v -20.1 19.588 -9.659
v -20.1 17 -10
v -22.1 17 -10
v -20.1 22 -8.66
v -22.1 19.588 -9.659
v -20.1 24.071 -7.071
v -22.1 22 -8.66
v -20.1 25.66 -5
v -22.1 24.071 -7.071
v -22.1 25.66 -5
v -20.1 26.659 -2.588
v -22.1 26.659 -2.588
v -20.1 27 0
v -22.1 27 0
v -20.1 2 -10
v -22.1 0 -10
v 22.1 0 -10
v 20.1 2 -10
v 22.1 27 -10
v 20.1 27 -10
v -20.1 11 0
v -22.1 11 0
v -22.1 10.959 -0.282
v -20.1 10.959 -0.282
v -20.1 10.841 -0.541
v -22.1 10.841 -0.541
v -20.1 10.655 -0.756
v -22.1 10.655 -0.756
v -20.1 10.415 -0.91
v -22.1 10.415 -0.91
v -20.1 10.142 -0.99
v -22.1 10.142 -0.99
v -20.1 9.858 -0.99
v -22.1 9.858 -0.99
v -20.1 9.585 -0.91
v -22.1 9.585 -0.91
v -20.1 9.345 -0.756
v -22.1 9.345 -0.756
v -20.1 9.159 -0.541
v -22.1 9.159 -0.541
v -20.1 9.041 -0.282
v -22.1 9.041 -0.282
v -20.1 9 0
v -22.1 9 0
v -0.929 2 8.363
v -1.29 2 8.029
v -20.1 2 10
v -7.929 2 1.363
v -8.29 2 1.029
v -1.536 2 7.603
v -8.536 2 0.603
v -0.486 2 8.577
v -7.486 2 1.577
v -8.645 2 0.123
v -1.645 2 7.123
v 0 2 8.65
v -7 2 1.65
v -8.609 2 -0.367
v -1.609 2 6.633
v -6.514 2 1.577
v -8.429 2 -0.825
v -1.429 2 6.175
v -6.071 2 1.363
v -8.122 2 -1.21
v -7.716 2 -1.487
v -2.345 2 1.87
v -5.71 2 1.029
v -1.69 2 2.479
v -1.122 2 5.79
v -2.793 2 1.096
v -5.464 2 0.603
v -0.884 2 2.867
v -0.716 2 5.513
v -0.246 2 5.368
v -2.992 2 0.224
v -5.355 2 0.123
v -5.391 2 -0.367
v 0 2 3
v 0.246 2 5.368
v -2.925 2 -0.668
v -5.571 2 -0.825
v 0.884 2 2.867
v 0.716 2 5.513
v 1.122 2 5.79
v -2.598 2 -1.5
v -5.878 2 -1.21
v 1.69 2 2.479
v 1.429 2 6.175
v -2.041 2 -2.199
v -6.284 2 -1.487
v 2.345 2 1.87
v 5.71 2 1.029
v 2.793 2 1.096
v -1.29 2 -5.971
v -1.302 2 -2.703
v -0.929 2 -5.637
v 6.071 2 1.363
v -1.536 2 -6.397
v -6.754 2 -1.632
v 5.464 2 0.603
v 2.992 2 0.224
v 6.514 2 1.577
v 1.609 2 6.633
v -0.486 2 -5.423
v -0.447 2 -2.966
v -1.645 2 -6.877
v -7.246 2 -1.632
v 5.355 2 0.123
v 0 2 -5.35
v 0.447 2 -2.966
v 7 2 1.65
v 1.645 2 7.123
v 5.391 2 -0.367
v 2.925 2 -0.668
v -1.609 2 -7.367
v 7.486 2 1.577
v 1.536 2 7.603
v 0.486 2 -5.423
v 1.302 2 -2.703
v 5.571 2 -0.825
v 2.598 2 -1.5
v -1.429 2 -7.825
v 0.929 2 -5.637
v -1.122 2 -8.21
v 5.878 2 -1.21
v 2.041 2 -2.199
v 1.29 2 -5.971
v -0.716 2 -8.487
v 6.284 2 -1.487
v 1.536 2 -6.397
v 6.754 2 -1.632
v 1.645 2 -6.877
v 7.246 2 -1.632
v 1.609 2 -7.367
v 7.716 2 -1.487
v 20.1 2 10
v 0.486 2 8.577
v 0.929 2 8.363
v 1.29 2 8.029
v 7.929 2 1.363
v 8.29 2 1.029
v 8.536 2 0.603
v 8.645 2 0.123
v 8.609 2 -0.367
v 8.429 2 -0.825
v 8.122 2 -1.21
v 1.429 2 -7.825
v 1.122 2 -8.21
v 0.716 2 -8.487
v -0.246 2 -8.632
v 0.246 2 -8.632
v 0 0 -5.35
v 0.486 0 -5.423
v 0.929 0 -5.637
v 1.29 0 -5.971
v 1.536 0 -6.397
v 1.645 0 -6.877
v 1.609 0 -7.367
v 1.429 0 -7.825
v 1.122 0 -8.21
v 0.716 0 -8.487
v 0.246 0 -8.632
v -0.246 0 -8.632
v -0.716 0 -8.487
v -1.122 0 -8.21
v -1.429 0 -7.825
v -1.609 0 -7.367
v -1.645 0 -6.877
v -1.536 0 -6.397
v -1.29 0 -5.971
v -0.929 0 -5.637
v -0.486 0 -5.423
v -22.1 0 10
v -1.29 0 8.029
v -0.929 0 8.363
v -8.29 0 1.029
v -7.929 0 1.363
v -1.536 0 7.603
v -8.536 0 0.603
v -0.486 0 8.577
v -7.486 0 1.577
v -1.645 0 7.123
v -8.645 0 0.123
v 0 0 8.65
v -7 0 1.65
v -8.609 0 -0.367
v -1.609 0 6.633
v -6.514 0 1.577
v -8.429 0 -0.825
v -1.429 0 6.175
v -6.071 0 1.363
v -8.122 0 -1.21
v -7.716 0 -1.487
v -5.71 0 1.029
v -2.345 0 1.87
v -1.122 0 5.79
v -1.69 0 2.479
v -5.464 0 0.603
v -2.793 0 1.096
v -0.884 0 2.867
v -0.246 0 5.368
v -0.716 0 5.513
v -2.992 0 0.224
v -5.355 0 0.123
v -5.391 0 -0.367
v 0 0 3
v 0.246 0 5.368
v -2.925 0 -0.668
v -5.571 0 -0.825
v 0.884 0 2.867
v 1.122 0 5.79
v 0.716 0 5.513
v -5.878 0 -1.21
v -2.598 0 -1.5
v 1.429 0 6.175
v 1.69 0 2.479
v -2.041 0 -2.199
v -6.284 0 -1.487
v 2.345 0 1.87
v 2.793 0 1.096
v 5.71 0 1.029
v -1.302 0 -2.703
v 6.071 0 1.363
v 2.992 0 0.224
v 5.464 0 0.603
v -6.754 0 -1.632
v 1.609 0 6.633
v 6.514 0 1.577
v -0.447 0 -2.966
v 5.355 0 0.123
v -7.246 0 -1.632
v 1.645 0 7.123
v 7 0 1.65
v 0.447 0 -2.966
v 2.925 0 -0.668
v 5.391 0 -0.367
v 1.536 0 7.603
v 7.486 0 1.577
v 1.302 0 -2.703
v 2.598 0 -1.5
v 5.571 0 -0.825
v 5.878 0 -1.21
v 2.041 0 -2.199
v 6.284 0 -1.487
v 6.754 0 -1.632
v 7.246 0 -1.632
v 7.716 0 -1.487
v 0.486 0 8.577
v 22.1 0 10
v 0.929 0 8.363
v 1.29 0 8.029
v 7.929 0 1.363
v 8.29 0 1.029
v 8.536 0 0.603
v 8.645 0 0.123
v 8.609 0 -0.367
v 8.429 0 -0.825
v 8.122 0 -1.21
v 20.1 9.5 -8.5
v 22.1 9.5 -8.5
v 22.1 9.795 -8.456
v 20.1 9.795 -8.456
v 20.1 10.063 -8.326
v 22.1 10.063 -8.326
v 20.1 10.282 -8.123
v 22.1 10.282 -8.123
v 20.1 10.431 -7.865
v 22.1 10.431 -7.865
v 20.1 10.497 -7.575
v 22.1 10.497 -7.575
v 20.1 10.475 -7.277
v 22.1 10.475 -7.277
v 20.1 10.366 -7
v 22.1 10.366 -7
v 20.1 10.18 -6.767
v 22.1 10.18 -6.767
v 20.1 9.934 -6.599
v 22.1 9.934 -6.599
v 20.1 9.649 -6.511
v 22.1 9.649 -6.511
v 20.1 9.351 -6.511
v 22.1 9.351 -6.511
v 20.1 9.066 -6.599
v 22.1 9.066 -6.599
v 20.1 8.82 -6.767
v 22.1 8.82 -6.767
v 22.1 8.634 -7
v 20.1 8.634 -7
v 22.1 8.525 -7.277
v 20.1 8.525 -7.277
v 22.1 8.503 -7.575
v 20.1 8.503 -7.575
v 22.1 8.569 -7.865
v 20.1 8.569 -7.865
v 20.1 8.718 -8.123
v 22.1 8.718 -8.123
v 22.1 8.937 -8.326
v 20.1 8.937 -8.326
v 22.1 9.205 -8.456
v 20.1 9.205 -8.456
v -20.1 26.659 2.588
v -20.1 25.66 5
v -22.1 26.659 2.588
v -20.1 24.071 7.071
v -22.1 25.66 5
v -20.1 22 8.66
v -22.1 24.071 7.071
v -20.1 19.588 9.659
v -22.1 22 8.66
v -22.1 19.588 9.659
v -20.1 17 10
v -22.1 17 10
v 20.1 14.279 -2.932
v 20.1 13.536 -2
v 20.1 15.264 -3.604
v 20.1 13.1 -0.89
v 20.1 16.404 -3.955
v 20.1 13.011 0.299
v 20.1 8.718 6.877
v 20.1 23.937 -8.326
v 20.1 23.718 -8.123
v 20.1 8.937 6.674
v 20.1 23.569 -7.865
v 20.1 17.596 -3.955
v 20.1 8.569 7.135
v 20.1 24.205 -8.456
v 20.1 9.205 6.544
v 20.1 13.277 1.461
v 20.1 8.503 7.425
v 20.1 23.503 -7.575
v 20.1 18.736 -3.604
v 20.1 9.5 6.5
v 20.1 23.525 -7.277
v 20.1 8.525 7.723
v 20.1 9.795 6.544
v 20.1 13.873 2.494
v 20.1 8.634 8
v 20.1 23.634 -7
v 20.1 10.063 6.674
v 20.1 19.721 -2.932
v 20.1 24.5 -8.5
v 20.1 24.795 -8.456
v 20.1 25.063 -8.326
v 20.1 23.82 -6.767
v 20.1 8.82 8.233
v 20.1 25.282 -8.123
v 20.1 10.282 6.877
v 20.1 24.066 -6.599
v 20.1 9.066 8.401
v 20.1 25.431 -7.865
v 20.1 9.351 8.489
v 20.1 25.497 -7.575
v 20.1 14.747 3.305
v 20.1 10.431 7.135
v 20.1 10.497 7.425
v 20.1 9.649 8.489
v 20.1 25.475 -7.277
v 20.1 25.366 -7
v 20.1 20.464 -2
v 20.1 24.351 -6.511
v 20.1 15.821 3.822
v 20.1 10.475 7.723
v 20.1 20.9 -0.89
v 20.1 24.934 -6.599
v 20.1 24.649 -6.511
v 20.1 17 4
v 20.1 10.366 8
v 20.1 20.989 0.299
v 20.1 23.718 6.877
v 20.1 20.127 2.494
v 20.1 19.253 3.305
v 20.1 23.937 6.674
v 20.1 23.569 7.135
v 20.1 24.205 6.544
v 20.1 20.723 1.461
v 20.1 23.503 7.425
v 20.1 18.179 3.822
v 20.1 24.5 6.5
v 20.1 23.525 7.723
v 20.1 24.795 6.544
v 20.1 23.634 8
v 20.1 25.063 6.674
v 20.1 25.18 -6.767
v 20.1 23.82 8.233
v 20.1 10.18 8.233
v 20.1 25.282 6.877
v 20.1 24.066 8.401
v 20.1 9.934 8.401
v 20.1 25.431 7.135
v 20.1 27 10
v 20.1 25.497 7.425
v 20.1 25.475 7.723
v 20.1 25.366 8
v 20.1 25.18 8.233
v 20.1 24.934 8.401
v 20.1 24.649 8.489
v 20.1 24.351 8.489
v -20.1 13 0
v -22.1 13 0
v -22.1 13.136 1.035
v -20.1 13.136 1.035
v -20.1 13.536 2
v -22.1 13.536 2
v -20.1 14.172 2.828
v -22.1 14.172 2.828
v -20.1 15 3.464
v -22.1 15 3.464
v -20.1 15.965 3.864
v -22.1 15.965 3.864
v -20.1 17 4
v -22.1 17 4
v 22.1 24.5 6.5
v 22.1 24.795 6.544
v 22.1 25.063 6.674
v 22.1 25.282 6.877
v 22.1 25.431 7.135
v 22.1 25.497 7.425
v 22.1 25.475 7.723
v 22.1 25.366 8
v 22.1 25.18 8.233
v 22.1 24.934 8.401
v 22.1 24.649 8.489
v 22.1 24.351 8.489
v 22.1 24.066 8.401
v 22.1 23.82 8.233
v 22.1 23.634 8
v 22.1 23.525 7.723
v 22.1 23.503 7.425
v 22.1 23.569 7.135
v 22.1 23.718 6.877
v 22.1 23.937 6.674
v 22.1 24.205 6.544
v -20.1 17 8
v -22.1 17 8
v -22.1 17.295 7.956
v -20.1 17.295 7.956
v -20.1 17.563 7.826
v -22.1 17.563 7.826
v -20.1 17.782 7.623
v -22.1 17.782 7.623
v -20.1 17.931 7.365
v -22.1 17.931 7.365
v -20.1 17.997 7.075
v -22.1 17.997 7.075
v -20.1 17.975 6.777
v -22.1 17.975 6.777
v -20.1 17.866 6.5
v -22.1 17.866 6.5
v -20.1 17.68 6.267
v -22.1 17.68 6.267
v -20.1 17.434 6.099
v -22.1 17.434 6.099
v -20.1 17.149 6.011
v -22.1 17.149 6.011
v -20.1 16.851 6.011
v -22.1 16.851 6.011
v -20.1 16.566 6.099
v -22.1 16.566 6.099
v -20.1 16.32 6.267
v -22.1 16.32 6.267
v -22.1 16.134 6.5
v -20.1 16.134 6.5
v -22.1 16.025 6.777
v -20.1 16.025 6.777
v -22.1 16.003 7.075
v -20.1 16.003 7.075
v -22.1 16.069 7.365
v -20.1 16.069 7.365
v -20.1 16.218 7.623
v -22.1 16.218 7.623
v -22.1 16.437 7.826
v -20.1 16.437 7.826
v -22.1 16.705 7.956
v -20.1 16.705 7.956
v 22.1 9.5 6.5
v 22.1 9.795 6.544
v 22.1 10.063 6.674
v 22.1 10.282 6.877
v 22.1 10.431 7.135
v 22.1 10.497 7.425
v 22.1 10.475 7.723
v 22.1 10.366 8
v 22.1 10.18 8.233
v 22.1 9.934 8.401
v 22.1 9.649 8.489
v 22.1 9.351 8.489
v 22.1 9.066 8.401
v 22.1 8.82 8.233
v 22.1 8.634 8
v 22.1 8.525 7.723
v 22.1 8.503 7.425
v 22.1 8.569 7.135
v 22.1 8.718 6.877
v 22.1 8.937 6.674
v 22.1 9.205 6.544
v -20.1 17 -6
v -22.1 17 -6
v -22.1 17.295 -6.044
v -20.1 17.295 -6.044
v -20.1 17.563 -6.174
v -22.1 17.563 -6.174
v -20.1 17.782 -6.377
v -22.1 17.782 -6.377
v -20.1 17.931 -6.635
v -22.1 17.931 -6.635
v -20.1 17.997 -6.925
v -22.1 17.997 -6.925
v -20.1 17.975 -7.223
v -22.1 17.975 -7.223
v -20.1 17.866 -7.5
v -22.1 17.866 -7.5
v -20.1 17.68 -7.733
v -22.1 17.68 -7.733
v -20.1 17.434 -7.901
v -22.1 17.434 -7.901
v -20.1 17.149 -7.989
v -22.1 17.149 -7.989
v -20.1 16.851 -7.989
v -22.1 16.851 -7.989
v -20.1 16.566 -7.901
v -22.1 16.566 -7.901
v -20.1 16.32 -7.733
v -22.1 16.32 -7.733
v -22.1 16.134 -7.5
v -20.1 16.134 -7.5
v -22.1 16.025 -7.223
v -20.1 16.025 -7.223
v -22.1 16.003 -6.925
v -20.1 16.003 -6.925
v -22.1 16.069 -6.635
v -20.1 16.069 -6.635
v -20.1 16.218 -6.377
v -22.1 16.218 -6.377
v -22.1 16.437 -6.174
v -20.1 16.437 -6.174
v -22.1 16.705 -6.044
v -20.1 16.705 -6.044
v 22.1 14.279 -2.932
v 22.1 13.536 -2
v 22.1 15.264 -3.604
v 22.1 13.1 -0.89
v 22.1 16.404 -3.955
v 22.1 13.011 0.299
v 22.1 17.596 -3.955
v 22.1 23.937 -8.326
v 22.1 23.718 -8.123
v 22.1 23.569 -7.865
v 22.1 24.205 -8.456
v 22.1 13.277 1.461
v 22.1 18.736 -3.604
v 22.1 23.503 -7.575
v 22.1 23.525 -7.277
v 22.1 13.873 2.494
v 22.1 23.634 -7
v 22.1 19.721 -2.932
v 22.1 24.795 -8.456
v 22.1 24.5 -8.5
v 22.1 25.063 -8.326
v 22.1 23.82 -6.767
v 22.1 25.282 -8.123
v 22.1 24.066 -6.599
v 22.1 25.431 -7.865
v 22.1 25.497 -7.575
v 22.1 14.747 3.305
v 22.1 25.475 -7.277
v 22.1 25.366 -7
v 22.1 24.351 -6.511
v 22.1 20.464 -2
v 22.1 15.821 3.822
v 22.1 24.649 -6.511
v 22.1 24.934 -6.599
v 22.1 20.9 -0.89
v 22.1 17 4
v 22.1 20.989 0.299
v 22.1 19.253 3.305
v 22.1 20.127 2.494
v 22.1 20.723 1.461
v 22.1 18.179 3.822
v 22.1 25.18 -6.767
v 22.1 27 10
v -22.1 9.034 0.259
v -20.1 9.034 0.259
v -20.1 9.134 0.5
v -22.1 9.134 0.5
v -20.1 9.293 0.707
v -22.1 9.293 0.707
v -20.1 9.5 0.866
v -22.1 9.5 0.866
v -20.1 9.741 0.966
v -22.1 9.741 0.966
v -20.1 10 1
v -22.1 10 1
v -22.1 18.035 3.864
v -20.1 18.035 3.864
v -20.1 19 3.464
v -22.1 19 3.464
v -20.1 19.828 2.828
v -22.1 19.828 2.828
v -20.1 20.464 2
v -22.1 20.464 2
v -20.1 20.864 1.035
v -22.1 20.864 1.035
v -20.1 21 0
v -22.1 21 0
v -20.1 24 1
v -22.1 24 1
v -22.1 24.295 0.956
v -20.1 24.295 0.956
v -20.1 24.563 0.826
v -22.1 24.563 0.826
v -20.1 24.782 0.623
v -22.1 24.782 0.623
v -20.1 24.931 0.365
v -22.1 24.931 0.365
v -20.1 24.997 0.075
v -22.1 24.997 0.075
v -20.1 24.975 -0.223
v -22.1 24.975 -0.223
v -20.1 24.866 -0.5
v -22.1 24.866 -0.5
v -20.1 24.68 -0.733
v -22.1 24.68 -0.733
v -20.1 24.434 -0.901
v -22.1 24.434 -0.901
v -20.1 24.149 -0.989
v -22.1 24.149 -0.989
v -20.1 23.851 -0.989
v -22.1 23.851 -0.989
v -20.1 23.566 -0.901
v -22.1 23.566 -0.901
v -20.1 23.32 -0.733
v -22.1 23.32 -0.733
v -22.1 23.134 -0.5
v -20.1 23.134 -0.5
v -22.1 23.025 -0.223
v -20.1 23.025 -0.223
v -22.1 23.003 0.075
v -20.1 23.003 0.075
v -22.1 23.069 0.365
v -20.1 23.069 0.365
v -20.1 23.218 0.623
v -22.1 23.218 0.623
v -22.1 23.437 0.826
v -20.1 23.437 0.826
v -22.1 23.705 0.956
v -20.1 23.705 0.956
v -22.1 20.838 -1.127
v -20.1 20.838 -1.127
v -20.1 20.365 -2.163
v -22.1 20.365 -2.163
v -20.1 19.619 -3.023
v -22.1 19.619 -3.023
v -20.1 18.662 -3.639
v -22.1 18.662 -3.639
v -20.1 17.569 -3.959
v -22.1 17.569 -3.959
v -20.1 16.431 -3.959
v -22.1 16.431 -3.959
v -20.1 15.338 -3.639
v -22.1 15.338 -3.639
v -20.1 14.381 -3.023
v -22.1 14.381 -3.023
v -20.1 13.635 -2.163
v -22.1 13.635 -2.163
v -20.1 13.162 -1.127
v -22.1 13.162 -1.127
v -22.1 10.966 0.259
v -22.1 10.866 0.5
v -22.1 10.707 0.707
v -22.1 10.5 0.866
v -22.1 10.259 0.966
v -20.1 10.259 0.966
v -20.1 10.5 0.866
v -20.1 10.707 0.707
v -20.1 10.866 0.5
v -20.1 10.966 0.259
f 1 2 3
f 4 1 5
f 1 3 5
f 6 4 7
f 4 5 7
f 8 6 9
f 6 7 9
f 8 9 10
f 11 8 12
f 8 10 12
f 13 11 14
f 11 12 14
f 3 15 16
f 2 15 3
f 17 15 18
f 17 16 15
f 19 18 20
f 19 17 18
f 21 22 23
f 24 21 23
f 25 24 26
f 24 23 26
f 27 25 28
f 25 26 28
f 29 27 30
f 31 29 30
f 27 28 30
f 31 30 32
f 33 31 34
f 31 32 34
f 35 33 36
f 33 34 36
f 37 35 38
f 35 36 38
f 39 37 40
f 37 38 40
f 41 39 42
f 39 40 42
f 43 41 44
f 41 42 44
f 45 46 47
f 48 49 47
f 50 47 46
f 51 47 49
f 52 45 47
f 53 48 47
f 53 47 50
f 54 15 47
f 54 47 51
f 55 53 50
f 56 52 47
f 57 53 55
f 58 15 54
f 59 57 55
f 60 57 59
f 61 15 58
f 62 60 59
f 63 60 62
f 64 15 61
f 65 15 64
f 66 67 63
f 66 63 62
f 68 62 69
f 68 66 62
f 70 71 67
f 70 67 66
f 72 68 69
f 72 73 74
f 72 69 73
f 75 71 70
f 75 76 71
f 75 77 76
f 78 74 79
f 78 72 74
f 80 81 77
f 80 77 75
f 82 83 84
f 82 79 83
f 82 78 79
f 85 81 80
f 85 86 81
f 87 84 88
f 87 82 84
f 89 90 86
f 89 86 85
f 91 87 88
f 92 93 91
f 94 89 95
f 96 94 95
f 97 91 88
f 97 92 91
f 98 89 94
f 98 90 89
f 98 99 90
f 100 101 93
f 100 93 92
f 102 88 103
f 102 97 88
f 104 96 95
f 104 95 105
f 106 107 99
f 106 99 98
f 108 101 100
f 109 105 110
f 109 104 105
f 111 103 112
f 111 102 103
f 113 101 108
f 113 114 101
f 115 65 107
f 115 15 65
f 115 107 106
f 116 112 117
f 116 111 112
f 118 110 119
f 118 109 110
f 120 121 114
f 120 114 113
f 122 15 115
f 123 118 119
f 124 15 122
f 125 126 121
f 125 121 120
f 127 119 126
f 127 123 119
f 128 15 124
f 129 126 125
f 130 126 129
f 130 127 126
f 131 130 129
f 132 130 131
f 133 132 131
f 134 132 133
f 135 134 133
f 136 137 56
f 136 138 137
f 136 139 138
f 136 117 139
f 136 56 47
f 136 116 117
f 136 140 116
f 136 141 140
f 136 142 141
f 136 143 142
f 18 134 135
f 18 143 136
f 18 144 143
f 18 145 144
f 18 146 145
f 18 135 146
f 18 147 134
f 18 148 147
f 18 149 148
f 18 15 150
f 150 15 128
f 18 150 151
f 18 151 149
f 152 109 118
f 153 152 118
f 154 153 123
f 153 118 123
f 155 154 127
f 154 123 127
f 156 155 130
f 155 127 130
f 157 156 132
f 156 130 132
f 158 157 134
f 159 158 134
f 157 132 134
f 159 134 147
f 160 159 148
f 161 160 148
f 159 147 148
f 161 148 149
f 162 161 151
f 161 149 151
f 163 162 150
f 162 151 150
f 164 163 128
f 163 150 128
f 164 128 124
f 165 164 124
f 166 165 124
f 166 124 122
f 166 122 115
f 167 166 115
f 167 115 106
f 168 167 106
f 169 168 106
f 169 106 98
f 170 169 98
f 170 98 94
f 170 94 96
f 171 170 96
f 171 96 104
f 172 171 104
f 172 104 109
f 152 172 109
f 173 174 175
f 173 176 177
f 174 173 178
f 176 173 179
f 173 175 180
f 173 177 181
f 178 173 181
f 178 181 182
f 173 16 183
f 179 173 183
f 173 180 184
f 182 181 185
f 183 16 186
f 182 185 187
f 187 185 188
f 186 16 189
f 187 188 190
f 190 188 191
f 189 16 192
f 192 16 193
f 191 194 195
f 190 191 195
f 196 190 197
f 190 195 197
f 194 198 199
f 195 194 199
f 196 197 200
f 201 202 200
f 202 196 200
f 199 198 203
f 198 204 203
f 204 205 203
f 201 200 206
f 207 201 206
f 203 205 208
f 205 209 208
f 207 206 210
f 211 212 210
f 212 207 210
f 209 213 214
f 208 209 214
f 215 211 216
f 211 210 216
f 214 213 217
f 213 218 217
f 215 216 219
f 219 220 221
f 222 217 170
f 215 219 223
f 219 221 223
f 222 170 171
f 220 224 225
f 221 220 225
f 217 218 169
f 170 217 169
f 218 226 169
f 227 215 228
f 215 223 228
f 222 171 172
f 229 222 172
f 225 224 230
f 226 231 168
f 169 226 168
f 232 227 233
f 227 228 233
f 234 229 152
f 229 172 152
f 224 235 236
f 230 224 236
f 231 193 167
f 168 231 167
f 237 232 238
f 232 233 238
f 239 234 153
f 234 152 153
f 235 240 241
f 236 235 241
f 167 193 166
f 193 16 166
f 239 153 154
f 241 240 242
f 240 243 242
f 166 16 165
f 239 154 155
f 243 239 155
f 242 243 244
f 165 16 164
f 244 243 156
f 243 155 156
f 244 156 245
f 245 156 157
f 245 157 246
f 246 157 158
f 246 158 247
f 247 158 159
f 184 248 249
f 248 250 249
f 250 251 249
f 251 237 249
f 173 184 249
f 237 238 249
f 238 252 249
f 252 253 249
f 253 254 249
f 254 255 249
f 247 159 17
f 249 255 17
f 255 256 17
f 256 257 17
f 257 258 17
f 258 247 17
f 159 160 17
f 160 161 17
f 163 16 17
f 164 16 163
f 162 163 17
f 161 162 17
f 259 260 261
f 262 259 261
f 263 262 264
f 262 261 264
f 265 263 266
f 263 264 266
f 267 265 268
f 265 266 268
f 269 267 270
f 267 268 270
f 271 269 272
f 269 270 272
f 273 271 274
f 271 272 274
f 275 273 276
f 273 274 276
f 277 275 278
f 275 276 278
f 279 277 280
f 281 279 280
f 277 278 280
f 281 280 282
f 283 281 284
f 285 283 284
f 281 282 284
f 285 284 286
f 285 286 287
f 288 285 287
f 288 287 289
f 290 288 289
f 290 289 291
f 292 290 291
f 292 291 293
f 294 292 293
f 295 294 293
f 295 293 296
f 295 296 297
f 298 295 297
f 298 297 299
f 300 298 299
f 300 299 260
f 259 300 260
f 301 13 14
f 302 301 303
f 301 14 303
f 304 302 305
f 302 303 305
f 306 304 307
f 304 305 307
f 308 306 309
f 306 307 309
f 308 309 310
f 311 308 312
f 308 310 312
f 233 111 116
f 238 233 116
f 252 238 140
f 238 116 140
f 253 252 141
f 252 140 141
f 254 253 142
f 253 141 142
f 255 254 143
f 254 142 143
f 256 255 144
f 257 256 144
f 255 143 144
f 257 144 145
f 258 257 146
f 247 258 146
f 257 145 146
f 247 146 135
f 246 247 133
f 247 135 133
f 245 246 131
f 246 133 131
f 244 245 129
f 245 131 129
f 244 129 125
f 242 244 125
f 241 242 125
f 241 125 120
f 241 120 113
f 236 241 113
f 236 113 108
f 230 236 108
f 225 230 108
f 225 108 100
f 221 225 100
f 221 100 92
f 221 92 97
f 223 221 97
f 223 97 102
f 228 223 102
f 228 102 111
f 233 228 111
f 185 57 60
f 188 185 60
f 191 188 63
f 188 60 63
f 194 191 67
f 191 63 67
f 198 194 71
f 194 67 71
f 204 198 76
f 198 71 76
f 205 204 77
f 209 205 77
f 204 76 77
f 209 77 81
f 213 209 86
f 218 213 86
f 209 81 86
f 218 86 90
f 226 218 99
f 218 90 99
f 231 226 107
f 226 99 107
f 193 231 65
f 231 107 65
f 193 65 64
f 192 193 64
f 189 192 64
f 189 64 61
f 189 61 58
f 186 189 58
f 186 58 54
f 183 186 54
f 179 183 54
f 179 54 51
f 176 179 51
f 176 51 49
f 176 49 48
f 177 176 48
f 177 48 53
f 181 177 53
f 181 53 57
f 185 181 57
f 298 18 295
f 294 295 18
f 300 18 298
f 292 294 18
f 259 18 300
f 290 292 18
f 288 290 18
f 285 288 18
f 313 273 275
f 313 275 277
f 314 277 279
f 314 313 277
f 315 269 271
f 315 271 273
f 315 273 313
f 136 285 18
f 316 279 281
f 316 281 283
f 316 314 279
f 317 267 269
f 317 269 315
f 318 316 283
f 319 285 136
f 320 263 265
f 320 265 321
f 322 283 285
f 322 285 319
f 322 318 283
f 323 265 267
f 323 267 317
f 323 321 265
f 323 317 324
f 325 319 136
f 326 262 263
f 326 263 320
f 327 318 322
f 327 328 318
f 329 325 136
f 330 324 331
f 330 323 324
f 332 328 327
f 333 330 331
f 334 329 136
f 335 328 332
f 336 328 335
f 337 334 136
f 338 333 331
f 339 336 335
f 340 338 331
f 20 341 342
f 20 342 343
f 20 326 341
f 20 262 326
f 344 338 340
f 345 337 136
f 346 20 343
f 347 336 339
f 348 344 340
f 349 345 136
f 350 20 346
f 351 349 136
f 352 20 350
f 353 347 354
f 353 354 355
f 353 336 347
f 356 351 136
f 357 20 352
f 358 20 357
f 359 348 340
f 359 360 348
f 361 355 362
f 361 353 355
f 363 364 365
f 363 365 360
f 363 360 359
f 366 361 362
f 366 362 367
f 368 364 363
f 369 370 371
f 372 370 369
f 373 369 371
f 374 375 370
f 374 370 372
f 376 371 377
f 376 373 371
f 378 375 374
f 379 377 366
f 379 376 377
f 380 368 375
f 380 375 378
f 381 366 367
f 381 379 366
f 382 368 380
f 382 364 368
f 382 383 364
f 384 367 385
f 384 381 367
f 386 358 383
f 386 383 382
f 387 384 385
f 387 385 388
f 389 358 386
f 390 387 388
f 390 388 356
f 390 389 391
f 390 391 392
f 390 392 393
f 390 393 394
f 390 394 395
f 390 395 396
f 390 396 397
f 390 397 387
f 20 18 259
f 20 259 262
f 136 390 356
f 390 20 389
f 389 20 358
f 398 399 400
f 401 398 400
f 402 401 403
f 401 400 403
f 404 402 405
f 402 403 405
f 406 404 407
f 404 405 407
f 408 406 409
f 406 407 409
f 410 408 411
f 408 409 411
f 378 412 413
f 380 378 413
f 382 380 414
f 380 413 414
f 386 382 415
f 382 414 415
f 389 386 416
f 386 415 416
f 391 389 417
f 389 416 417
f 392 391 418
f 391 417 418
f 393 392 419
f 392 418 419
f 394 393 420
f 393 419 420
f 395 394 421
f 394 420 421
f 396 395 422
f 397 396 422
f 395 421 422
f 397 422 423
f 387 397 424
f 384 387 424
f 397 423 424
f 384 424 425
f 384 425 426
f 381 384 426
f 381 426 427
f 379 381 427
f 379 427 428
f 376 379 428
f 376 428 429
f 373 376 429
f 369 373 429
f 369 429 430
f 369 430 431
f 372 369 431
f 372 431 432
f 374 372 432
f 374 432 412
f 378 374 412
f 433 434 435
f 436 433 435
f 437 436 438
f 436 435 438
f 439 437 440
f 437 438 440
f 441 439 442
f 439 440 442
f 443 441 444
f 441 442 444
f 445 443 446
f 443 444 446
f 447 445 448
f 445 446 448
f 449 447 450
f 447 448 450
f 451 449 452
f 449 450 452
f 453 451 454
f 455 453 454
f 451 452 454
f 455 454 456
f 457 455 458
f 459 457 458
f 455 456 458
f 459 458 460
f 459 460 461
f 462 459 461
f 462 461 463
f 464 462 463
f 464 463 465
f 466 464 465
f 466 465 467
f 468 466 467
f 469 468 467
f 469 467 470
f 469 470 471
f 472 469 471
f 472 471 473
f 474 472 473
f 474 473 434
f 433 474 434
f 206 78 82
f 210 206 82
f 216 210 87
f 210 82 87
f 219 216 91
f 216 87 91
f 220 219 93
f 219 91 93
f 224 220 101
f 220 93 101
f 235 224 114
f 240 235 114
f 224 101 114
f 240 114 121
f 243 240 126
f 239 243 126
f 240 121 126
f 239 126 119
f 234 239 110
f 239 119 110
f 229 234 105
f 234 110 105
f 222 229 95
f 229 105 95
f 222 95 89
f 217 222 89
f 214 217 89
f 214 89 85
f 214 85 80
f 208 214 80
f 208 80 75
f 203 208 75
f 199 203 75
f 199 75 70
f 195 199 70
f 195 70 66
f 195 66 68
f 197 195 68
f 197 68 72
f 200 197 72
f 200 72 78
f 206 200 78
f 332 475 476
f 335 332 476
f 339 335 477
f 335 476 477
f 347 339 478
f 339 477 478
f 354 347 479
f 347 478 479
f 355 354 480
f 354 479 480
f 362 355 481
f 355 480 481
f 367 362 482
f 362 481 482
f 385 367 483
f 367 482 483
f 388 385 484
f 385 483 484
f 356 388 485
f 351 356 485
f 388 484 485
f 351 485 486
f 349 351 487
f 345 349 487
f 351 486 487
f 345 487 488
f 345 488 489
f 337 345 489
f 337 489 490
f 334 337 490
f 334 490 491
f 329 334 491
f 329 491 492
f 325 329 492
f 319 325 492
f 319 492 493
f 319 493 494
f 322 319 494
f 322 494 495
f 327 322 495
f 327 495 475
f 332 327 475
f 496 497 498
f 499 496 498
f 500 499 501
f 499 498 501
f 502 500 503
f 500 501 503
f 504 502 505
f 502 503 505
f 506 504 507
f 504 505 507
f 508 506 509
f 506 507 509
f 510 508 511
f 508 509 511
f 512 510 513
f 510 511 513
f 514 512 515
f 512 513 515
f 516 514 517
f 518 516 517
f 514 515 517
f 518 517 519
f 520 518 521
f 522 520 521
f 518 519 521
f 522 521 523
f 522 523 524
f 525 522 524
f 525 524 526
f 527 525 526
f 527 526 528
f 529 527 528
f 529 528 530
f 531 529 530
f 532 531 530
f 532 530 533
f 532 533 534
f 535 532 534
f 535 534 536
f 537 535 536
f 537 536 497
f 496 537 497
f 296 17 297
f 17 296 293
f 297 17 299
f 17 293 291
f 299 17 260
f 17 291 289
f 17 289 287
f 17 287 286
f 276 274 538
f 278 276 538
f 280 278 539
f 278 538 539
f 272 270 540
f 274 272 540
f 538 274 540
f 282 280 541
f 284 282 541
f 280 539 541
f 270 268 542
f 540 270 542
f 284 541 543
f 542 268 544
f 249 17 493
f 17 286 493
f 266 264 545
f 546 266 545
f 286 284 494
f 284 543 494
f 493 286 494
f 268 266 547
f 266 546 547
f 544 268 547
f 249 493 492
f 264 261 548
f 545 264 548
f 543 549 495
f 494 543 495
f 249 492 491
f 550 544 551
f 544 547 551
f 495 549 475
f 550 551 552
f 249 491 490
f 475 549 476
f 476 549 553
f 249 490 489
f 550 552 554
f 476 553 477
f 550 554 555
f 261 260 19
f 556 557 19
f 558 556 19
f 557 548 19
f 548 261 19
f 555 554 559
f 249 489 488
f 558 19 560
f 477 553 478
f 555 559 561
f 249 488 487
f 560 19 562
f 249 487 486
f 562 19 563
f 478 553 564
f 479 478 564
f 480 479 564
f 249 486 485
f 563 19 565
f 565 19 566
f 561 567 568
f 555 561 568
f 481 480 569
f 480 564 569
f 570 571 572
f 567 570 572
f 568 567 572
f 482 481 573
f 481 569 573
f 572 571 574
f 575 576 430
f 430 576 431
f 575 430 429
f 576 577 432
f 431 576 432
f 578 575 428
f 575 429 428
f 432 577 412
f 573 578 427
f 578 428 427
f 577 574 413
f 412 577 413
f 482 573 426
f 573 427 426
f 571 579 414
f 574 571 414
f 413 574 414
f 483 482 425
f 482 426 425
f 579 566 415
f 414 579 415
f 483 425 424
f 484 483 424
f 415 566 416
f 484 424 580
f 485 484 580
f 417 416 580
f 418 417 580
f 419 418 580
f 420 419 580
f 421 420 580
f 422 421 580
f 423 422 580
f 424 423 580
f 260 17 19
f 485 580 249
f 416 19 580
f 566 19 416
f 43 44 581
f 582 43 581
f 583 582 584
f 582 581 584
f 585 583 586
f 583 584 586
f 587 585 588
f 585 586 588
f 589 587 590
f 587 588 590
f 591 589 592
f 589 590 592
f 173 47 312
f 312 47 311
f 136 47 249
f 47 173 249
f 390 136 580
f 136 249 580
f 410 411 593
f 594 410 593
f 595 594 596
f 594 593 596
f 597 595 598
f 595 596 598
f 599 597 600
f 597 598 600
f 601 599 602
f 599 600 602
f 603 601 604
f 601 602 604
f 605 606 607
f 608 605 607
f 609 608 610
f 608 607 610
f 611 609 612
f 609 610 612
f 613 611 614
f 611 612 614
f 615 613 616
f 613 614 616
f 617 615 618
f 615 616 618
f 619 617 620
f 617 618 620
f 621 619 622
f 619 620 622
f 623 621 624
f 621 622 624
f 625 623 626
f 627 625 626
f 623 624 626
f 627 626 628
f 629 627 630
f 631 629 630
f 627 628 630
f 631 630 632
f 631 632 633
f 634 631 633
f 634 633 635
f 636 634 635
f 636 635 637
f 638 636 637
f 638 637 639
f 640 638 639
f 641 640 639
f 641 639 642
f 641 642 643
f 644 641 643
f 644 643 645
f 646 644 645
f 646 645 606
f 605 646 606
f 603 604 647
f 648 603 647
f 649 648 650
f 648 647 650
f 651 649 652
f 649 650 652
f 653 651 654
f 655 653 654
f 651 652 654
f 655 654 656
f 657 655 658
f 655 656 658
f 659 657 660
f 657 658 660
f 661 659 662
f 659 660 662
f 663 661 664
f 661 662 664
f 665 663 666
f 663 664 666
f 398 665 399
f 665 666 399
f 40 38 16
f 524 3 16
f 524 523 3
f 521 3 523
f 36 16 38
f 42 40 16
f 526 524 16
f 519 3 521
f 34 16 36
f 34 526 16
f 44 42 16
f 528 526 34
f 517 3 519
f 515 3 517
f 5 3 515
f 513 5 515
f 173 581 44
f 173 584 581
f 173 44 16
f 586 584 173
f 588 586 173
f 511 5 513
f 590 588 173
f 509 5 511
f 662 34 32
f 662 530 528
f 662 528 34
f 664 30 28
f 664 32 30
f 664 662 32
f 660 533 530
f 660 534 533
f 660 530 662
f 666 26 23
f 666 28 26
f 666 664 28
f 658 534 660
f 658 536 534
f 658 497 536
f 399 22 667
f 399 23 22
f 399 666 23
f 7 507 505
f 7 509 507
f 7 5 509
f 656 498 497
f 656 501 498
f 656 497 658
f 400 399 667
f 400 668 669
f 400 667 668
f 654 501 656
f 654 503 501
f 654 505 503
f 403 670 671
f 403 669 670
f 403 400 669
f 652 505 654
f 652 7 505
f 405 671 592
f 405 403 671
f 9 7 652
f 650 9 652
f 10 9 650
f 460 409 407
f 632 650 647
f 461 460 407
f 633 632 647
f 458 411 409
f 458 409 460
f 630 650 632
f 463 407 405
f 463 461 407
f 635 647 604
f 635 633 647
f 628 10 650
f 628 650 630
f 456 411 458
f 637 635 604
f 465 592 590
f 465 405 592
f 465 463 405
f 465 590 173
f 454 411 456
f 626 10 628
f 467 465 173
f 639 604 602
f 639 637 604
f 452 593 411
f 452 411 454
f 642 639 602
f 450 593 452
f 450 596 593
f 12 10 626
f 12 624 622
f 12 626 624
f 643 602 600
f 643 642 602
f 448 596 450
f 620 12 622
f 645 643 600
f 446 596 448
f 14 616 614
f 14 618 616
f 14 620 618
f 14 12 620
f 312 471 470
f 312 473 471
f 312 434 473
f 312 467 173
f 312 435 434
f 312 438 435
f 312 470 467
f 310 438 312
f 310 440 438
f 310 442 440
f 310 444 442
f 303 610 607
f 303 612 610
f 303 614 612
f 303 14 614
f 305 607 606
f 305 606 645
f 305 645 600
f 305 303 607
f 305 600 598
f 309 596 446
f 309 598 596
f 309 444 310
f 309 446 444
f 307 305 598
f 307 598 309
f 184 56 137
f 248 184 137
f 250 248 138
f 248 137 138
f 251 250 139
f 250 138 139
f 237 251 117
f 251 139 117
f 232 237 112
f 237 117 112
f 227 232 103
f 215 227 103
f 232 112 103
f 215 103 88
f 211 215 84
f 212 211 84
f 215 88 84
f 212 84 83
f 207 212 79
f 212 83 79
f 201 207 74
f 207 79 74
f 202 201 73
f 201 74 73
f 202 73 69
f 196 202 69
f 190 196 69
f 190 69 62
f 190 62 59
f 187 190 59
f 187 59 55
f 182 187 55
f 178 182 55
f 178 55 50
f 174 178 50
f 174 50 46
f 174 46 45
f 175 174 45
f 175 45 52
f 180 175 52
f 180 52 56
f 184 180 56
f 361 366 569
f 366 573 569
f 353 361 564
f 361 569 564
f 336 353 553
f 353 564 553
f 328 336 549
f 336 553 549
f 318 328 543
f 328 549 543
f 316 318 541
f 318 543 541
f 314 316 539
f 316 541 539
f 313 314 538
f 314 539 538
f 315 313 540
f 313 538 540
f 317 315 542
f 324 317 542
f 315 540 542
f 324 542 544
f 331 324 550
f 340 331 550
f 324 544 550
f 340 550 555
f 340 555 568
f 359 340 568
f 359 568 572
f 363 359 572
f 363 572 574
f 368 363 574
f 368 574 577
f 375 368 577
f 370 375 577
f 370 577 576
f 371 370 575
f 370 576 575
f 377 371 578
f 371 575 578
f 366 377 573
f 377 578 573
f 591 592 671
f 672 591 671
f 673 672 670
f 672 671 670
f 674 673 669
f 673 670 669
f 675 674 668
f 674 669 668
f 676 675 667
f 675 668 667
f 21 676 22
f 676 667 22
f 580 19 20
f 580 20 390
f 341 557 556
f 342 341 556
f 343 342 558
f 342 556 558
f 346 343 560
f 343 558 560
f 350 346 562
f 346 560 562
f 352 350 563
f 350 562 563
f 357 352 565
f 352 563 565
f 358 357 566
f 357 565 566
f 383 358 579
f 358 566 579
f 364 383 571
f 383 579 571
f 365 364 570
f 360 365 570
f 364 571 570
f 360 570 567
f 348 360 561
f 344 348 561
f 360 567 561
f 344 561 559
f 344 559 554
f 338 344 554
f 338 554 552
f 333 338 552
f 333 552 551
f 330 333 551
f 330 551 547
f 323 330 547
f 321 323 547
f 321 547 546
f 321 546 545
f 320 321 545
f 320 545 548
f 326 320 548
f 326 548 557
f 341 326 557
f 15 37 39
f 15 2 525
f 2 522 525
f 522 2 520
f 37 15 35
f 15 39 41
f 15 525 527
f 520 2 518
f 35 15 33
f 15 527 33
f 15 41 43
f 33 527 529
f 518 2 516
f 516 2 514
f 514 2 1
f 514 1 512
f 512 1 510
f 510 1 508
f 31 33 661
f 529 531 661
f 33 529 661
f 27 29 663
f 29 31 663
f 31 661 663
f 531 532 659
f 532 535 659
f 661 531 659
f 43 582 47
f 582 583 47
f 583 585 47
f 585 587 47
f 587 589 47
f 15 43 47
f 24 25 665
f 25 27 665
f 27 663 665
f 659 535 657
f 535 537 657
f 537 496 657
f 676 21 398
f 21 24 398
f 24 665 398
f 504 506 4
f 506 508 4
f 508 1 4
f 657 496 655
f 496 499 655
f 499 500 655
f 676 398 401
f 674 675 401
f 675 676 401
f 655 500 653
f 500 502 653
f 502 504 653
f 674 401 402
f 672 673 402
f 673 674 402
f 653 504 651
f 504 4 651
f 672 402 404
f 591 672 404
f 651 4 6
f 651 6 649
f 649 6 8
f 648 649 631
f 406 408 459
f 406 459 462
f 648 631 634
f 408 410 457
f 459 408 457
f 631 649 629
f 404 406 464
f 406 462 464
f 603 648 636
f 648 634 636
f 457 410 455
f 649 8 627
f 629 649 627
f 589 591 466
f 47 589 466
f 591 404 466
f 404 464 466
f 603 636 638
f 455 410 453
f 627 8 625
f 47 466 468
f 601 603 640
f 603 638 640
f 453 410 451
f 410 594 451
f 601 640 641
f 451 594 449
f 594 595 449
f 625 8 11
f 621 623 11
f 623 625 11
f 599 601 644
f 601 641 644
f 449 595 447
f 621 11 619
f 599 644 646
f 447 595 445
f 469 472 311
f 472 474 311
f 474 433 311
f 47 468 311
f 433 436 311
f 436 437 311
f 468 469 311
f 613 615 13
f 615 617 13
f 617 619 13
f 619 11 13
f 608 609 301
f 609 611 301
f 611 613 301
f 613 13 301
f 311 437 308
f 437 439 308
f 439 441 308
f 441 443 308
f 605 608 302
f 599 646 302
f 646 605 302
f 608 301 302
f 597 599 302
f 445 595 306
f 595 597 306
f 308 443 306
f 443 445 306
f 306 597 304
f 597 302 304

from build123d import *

# Parameters (mm, degrees)
SKETCH_1_W          = 44.2
SKETCH_1_H          = 20
EXTRUDE_1_DEPTH     = 2
CUT_EXTRUDE_1_REACH = 26.339
SKETCH_2_R          = 3
SKETCH_2_R_2        = 1.65
SKETCH_3_W          = 20
SKETCH_3_H          = 25
EXTRUDE_2_DEPTH     = 2
CUT_EXTRUDE_2_REACH = 54.751
SKETCH_4_R          = 1
CUT_EXTRUDE_3_REACH = 54.751
SKETCH_5_R          = 4
SKETCH_5_R_2        = 1


with BuildPart() as part:
    # 草图1 → 凸台-拉伸1 (new body)
    with BuildSketch(Plane(origin=(0, 0, 0), x_dir=(1, 0, 0), z_dir=(0, 1, 0))):
        Rectangle(SKETCH_1_W, SKETCH_1_H)
    extrude(amount=EXTRUDE_1_DEPTH)

    # 草图2 → 切除-拉伸1 (cut, up to next)
    with BuildSketch(Plane(origin=(0, 2, 0), x_dir=(1, 0, 0), z_dir=(0, 1, 0)), mode=Mode.PRIVATE) as cut_extrude_1_sk1:
        with Locations(Location((0, 0, 0), (0, 0, 270))):
            Circle(SKETCH_2_R)
    cut_extrude_1_tool1 = extrude(cut_extrude_1_sk1.sketch, amount=-CUT_EXTRUDE_1_REACH, mode=Mode.PRIVATE) & part.part
    # 草图2 → 切除-拉伸1 (cut, up to next)
    with BuildSketch(Plane(origin=(0, 2, 0), x_dir=(1, 0, 0), z_dir=(0, 1, 0)), mode=Mode.PRIVATE) as cut_extrude_1_sk2:
        with Locations(Location((0, 7, 0), (0, 0, 270))):
            Circle(SKETCH_2_R_2)
    cut_extrude_1_tool2 = extrude(cut_extrude_1_sk2.sketch, amount=-CUT_EXTRUDE_1_REACH, mode=Mode.PRIVATE) & part.part
    # 草图2 → 切除-拉伸1 (cut, up to next)
    with BuildSketch(Plane(origin=(0, 2, 0), x_dir=(1, 0, 0), z_dir=(0, 1, 0)), mode=Mode.PRIVATE) as cut_extrude_1_sk3:
        with Locations(Location((7, 0, 0), (0, 0, 270))):
            Circle(SKETCH_2_R_2)
    cut_extrude_1_tool3 = extrude(cut_extrude_1_sk3.sketch, amount=-CUT_EXTRUDE_1_REACH, mode=Mode.PRIVATE) & part.part
    # 草图2 → 切除-拉伸1 (cut, up to next)
    with BuildSketch(Plane(origin=(0, 2, 0), x_dir=(1, 0, 0), z_dir=(0, 1, 0)), mode=Mode.PRIVATE) as cut_extrude_1_sk4:
        with Locations(Location((0, -7, 0), (0, 0, 270))):
            Circle(SKETCH_2_R_2)
    cut_extrude_1_tool4 = extrude(cut_extrude_1_sk4.sketch, amount=-CUT_EXTRUDE_1_REACH, mode=Mode.PRIVATE) & part.part
    # 草图2 → 切除-拉伸1 (cut, up to next)
    with BuildSketch(Plane(origin=(0, 2, 0), x_dir=(1, 0, 0), z_dir=(0, 1, 0)), mode=Mode.PRIVATE) as cut_extrude_1_sk5:
        with Locations(Location((-7, 0, 0), (0, 0, 270))):
            Circle(SKETCH_2_R_2)
    cut_extrude_1_tool5 = extrude(cut_extrude_1_sk5.sketch, amount=-CUT_EXTRUDE_1_REACH, mode=Mode.PRIVATE) & part.part
    add(cut_extrude_1_tool1.solids().sort_by_distance((0, 2, 0))[0], mode=Mode.SUBTRACT)
    add(cut_extrude_1_tool2.solids().sort_by_distance((0, 2, -7))[0], mode=Mode.SUBTRACT)
    add(cut_extrude_1_tool3.solids().sort_by_distance((7, 2, 0))[0], mode=Mode.SUBTRACT)
    add(cut_extrude_1_tool4.solids().sort_by_distance((0, 2, 7))[0], mode=Mode.SUBTRACT)
    add(cut_extrude_1_tool5.solids().sort_by_distance((-7, 2, 0))[0], mode=Mode.SUBTRACT)

    # 草图3 → 凸台-拉伸2 (add)
    with BuildSketch(Plane.ZY.offset(22.1)):
        with Locations((0, 14.5)):
            Rectangle(SKETCH_3_W, SKETCH_3_H)
    extrude_2 = extrude(amount=-EXTRUDE_2_DEPTH)

    # 镜向2: 凸台-拉伸2 across plane
    add(extrude_2.mirror(Plane.ZY))

    # 草图4 → 切除-拉伸2 (cut, up to next)
    with BuildSketch(Plane.ZY.offset(22.1), mode=Mode.PRIVATE) as cut_extrude_2_sk1:
        with BuildLine():
            ThreePointArc((-10, 17), (-7.071067812, 24.071067812), (0, 27))
            Line((0, 27), (-10, 27))
            Line((-10, 27), (-10, 17))
        make_face()
    cut_extrude_2_tool1 = extrude(cut_extrude_2_sk1.sketch, amount=-CUT_EXTRUDE_2_REACH, mode=Mode.PRIVATE) & part.part
    # 草图4 → 切除-拉伸2 (cut, up to next)
    with BuildSketch(Plane.ZY.offset(22.1), mode=Mode.PRIVATE) as cut_extrude_2_sk2:
        with BuildLine():
            Line((10, 27), (0, 27))
            ThreePointArc((0, 27), (7.071067812, 24.071067812), (10, 17))
            Line((10, 17), (10, 27))
        make_face()
    cut_extrude_2_tool2 = extrude(cut_extrude_2_sk2.sketch, amount=-CUT_EXTRUDE_2_REACH, mode=Mode.PRIVATE) & part.part
    # 草图4 → 切除-拉伸2 (cut, up to next)
    with BuildSketch(Plane.ZY.offset(22.1), mode=Mode.PRIVATE) as cut_extrude_2_sk3:
        with BuildLine():
            ThreePointArc((1, 10), (0.707106781, 10.707106781), (0, 11))
            Line((0, 11), (0, 9))
            ThreePointArc((0, 9), (0.707106781, 9.292893219), (1, 10))
        make_face()
    cut_extrude_2_tool3 = extrude(cut_extrude_2_sk3.sketch, amount=-CUT_EXTRUDE_2_REACH, mode=Mode.PRIVATE) & part.part
    # 草图4 → 切除-拉伸2 (cut, up to next)
    with BuildSketch(Plane.ZY.offset(22.1), mode=Mode.PRIVATE) as cut_extrude_2_sk4:
        with BuildLine():
            Line((0, 9), (0, 11))
            ThreePointArc((0, 11), (-1, 10), (0, 9))
        make_face()
    cut_extrude_2_tool4 = extrude(cut_extrude_2_sk4.sketch, amount=-CUT_EXTRUDE_2_REACH, mode=Mode.PRIVATE) & part.part
    # 草图4 → 切除-拉伸2 (cut, up to next)
    with BuildSketch(Plane.ZY.offset(22.1), mode=Mode.PRIVATE) as cut_extrude_2_sk5:
        with BuildLine():
            ThreePointArc((1, 10), (0.707106781, 10.707106781), (0, 11))
            Line((0, 11), (0, 9))
            ThreePointArc((0, 9), (0.707106781, 9.292893219), (1, 10))
        make_face()
    cut_extrude_2_tool5 = extrude(cut_extrude_2_sk5.sketch, amount=-CUT_EXTRUDE_2_REACH, mode=Mode.PRIVATE) & part.part
    # 草图4 → 切除-拉伸2 (cut, up to next)
    with BuildSketch(Plane.ZY.offset(22.1), mode=Mode.PRIVATE) as cut_extrude_2_sk6:
        with BuildLine():
            Line((0, 9), (0, 11))
            ThreePointArc((0, 11), (-1, 10), (0, 9))
        make_face()
    cut_extrude_2_tool6 = extrude(cut_extrude_2_sk6.sketch, amount=-CUT_EXTRUDE_2_REACH, mode=Mode.PRIVATE) & part.part
    # 草图4 → 切除-拉伸2 (cut, up to next)
    with BuildSketch(Plane.ZY.offset(22.1), mode=Mode.PRIVATE) as cut_extrude_2_sk7:
        with BuildLine():
            ThreePointArc((4, 17), (2.828427125, 19.828427125), (0, 21))
            Line((0, 21), (0, 13))
            ThreePointArc((0, 13), (2.828427125, 14.171572875), (4, 17))
        make_face()
    cut_extrude_2_tool7 = extrude(cut_extrude_2_sk7.sketch, amount=-CUT_EXTRUDE_2_REACH, mode=Mode.PRIVATE) & part.part
    # 草图4 → 切除-拉伸2 (cut, up to next)
    with BuildSketch(Plane.ZY.offset(22.1), mode=Mode.PRIVATE) as cut_extrude_2_sk8:
        with BuildLine():
            Line((0, 13), (0, 21))
            ThreePointArc((0, 21), (-4, 17), (0, 13))
        make_face()
    cut_extrude_2_tool8 = extrude(cut_extrude_2_sk8.sketch, amount=-CUT_EXTRUDE_2_REACH, mode=Mode.PRIVATE) & part.part
    # 草图4 → 切除-拉伸2 (cut, up to next)
    with BuildSketch(Plane.ZY.offset(22.1), mode=Mode.PRIVATE) as cut_extrude_2_sk9:
        with BuildLine():
            ThreePointArc((4, 17), (2.828427125, 19.828427125), (0, 21))
            Line((0, 21), (0, 13))
            ThreePointArc((0, 13), (2.828427125, 14.171572875), (4, 17))
        make_face()
    cut_extrude_2_tool9 = extrude(cut_extrude_2_sk9.sketch, amount=-CUT_EXTRUDE_2_REACH, mode=Mode.PRIVATE) & part.part
    # 草图4 → 切除-拉伸2 (cut, up to next)
    with BuildSketch(Plane.ZY.offset(22.1), mode=Mode.PRIVATE) as cut_extrude_2_sk10:
        with BuildLine():
            Line((0, 13), (0, 21))
            ThreePointArc((0, 21), (-4, 17), (0, 13))
        make_face()
    cut_extrude_2_tool10 = extrude(cut_extrude_2_sk10.sketch, amount=-CUT_EXTRUDE_2_REACH, mode=Mode.PRIVATE) & part.part
    # 草图4 → 切除-拉伸2 (cut, up to next)
    with BuildSketch(Plane.ZY.offset(22.1), mode=Mode.PRIVATE) as cut_extrude_2_sk11:
        with Locations((7, 17)):
            Circle(SKETCH_4_R)
    cut_extrude_2_tool11 = extrude(cut_extrude_2_sk11.sketch, amount=-CUT_EXTRUDE_2_REACH, mode=Mode.PRIVATE) & part.part
    # 草图4 → 切除-拉伸2 (cut, up to next)
    with BuildSketch(Plane.ZY.offset(22.1), mode=Mode.PRIVATE) as cut_extrude_2_sk12:
        with Locations((0, 24)):
            Circle(SKETCH_4_R)
    cut_extrude_2_tool12 = extrude(cut_extrude_2_sk12.sketch, amount=-CUT_EXTRUDE_2_REACH, mode=Mode.PRIVATE) & part.part
    # 草图4 → 切除-拉伸2 (cut, up to next)
    with BuildSketch(Plane.ZY.offset(22.1), mode=Mode.PRIVATE) as cut_extrude_2_sk13:
        with Locations((-7, 17)):
            Circle(SKETCH_4_R)
    cut_extrude_2_tool13 = extrude(cut_extrude_2_sk13.sketch, amount=-CUT_EXTRUDE_2_REACH, mode=Mode.PRIVATE) & part.part
    add(cut_extrude_2_tool1.solids().sort_by_distance((-22.1, 24.766321, -7.766321))[0], mode=Mode.SUBTRACT)
    add(cut_extrude_2_tool2.solids().sort_by_distance((-22.1, 24.766321, 7.766321))[0], mode=Mode.SUBTRACT)
    add(cut_extrude_2_tool3.solids().sort_by_distance((-22.1, 10, 0.424413))[0], mode=Mode.SUBTRACT)
    add(cut_extrude_2_tool4.solids().sort_by_distance((-22.1, 10, -0.424413))[0], mode=Mode.SUBTRACT)
    add(cut_extrude_2_tool5.solids().sort_by_distance((-22.1, 10, 0.424413))[0], mode=Mode.SUBTRACT)
    add(cut_extrude_2_tool6.solids().sort_by_distance((-22.1, 10, -0.424413))[0], mode=Mode.SUBTRACT)
    add(cut_extrude_2_tool7.solids().sort_by_distance((-22.1, 17, 1.697653))[0], mode=Mode.SUBTRACT)
    add(cut_extrude_2_tool8.solids().sort_by_distance((-22.1, 17, -1.697653))[0], mode=Mode.SUBTRACT)
    add(cut_extrude_2_tool9.solids().sort_by_distance((-22.1, 17, 1.697653))[0], mode=Mode.SUBTRACT)
    add(cut_extrude_2_tool10.solids().sort_by_distance((-22.1, 17, -1.697653))[0], mode=Mode.SUBTRACT)
    add(cut_extrude_2_tool11.solids().sort_by_distance((-22.1, 17, 7))[0], mode=Mode.SUBTRACT)
    add(cut_extrude_2_tool12.solids().sort_by_distance((-22.1, 24, 0))[0], mode=Mode.SUBTRACT)
    add(cut_extrude_2_tool13.solids().sort_by_distance((-22.1, 17, -7))[0], mode=Mode.SUBTRACT)

    # 草图5 → 切除-拉伸3 (cut, up to next)
    with BuildSketch(Plane(origin=(22.1, 0, 0), x_dir=(0, 0, -1), z_dir=(1, 0, 0)), mode=Mode.PRIVATE) as cut_extrude_3_sk1:
        with Locations(Location((0, 17, 0), (0, 0, 180))):
            Circle(SKETCH_5_R)
    cut_extrude_3_tool1 = extrude(cut_extrude_3_sk1.sketch, amount=-CUT_EXTRUDE_3_REACH, mode=Mode.PRIVATE) & part.part
    # 草图5 → 切除-拉伸3 (cut, up to next)
    with BuildSketch(Plane(origin=(22.1, 0, 0), x_dir=(0, 0, -1), z_dir=(1, 0, 0)), mode=Mode.PRIVATE) as cut_extrude_3_sk2:
        with Locations((-7.5, 24.5)):
            Circle(SKETCH_5_R_2)
    cut_extrude_3_tool2 = extrude(cut_extrude_3_sk2.sketch, amount=-CUT_EXTRUDE_3_REACH, mode=Mode.PRIVATE) & part.part
    # 草图5 → 切除-拉伸3 (cut, up to next)
    with BuildSketch(Plane(origin=(22.1, 0, 0), x_dir=(0, 0, -1), z_dir=(1, 0, 0)), mode=Mode.PRIVATE) as cut_extrude_3_sk3:
        with Locations((7.5, 24.5)):
            Circle(SKETCH_5_R_2)
    cut_extrude_3_tool3 = extrude(cut_extrude_3_sk3.sketch, amount=-CUT_EXTRUDE_3_REACH, mode=Mode.PRIVATE) & part.part
    # 草图5 → 切除-拉伸3 (cut, up to next)
    with BuildSketch(Plane(origin=(22.1, 0, 0), x_dir=(0, 0, -1), z_dir=(1, 0, 0)), mode=Mode.PRIVATE) as cut_extrude_3_sk4:
        with Locations((7.5, 9.5)):
            Circle(SKETCH_5_R_2)
    cut_extrude_3_tool4 = extrude(cut_extrude_3_sk4.sketch, amount=-CUT_EXTRUDE_3_REACH, mode=Mode.PRIVATE) & part.part
    # 草图5 → 切除-拉伸3 (cut, up to next)
    with BuildSketch(Plane(origin=(22.1, 0, 0), x_dir=(0, 0, -1), z_dir=(1, 0, 0)), mode=Mode.PRIVATE) as cut_extrude_3_sk5:
        with Locations((-7.5, 9.5)):
            Circle(SKETCH_5_R_2)
    cut_extrude_3_tool5 = extrude(cut_extrude_3_sk5.sketch, amount=-CUT_EXTRUDE_3_REACH, mode=Mode.PRIVATE) & part.part
    add(cut_extrude_3_tool1.solids().sort_by_distance((22.1, 17, 0))[0], mode=Mode.SUBTRACT)
    add(cut_extrude_3_tool2.solids().sort_by_distance((22.1, 24.5, 7.5))[0], mode=Mode.SUBTRACT)
    add(cut_extrude_3_tool3.solids().sort_by_distance((22.1, 24.5, -7.5))[0], mode=Mode.SUBTRACT)
    add(cut_extrude_3_tool4.solids().sort_by_distance((22.1, 9.5, -7.5))[0], mode=Mode.SUBTRACT)
    add(cut_extrude_3_tool5.solids().sort_by_distance((22.1, 9.5, 7.5))[0], mode=Mode.SUBTRACT)


solid = part.part
